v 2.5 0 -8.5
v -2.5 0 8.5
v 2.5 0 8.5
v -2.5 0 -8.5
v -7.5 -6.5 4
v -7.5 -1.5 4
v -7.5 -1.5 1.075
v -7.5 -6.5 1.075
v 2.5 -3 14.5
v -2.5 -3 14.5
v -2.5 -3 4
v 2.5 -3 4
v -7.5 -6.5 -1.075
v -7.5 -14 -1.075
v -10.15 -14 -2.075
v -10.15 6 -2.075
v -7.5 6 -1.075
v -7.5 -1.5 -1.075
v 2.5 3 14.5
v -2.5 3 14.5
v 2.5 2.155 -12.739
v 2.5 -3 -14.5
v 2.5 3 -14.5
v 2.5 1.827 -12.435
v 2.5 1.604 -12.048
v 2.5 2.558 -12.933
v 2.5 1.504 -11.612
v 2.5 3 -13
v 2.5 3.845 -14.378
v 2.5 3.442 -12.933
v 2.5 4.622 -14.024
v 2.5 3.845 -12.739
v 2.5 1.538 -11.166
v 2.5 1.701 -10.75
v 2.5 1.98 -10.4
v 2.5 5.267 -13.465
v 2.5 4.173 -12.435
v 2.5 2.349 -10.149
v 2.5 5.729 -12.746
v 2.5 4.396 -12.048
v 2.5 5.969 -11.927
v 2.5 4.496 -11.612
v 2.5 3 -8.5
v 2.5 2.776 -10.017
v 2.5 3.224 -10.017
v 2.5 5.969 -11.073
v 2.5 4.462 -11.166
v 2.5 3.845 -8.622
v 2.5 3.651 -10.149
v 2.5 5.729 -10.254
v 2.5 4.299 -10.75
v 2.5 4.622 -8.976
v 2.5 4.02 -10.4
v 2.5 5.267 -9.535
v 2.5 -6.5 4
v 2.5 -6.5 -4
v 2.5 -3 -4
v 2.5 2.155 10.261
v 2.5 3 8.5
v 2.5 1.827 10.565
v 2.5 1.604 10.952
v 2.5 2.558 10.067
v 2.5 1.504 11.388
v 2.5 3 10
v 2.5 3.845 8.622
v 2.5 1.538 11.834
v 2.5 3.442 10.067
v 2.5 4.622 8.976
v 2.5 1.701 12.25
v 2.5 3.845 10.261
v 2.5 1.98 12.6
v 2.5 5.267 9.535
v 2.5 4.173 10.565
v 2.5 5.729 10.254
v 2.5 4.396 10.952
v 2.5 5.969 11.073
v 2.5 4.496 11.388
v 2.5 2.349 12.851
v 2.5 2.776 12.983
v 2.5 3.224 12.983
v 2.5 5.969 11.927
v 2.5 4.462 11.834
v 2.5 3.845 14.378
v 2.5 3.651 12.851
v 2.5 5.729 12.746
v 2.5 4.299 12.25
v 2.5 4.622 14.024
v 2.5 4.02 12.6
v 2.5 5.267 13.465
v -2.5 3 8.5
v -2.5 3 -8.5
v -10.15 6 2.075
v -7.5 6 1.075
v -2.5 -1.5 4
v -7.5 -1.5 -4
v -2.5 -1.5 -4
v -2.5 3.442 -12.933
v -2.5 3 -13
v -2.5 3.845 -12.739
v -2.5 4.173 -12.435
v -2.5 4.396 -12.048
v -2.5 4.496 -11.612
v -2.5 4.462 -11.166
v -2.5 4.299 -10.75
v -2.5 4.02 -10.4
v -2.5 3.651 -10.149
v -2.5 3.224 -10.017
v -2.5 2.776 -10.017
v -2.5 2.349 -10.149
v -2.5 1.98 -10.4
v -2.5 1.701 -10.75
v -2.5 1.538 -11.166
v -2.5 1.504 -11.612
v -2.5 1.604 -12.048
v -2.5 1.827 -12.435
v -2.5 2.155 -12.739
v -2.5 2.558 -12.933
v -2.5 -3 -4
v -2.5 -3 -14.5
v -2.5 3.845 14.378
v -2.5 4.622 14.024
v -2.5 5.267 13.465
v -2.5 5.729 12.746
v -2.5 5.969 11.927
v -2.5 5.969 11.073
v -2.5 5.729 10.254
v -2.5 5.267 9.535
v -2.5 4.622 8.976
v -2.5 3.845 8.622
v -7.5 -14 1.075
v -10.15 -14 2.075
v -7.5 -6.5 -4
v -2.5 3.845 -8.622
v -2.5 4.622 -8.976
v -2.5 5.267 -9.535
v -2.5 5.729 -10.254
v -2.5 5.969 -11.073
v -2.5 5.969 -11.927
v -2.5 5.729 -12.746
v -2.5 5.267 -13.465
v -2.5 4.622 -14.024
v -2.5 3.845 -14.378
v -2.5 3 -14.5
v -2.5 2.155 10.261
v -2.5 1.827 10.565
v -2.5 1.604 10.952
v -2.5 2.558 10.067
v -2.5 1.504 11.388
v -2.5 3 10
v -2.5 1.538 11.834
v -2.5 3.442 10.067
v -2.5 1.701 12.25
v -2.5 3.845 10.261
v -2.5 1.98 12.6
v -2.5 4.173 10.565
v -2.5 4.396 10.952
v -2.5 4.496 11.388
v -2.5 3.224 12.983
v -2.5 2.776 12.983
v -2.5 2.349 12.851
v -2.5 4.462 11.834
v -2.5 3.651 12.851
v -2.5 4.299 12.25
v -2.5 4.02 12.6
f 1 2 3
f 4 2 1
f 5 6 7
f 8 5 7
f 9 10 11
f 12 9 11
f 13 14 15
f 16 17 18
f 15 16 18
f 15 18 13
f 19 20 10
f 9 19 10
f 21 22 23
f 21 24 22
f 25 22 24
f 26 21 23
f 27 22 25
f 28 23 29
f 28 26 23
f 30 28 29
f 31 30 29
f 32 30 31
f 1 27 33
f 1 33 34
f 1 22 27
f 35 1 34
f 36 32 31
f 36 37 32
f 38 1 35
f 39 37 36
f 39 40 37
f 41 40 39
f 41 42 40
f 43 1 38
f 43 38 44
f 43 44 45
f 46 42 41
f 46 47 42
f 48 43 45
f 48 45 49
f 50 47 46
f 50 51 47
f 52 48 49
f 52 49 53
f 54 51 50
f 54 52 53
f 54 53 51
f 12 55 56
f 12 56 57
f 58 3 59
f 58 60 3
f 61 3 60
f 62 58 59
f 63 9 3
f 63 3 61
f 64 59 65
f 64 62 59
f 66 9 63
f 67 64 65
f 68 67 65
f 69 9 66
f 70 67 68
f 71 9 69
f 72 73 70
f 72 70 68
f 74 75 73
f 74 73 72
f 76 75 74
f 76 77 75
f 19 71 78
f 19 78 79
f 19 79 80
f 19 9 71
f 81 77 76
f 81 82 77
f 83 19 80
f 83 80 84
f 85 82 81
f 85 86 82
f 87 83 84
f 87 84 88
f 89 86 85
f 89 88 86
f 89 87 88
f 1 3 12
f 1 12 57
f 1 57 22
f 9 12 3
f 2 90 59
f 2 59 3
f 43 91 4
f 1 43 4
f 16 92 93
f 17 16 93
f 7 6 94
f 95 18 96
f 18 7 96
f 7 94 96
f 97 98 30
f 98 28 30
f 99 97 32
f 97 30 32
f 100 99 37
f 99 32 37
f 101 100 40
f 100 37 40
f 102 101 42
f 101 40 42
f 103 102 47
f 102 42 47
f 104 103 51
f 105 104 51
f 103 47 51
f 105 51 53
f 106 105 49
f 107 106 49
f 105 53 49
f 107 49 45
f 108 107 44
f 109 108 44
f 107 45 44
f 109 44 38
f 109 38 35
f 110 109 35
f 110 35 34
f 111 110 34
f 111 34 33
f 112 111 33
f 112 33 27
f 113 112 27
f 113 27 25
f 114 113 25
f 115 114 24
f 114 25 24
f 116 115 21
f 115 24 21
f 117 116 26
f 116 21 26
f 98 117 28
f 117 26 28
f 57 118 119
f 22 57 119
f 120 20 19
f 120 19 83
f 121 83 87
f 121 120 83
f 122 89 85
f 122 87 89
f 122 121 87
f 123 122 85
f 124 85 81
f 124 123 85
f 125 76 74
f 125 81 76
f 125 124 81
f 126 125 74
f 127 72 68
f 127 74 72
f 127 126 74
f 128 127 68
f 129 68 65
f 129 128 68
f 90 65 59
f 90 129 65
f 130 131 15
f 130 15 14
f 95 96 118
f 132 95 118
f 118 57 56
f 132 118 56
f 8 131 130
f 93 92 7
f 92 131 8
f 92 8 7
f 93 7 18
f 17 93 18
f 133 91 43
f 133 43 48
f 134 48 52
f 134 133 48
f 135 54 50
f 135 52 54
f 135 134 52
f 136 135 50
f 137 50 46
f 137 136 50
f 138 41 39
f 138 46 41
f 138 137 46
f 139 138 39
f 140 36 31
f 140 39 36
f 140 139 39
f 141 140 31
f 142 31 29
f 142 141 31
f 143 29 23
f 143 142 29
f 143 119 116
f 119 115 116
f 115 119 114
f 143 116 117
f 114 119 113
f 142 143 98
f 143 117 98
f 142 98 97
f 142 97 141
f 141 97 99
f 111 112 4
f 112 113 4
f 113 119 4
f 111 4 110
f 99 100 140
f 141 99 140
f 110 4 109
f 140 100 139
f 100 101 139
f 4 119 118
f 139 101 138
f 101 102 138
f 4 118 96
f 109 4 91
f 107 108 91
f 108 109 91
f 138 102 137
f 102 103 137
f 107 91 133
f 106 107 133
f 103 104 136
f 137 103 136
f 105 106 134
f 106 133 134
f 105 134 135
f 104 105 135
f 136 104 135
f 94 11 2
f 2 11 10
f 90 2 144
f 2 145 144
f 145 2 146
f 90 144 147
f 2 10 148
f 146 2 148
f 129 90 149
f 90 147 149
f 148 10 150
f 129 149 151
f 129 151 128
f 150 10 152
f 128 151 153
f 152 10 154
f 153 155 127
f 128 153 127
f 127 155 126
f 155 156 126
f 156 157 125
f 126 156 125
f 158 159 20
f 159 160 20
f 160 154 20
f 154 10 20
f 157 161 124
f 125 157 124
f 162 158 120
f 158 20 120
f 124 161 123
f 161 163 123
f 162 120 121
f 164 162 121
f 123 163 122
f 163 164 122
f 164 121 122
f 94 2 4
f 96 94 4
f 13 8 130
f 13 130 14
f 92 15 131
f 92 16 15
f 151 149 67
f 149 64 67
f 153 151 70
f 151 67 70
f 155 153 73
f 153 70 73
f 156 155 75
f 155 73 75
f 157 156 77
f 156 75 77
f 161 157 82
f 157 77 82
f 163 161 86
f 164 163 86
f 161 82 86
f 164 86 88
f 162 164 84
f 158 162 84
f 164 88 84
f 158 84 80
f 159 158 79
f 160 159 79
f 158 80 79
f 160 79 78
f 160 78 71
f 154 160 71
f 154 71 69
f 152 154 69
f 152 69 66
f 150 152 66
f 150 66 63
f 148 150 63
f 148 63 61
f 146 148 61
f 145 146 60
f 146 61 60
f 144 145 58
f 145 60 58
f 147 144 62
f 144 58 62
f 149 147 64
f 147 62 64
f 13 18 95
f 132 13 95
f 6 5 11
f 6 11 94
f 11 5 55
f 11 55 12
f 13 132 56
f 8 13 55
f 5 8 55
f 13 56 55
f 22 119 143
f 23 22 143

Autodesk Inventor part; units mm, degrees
ref_plane "YZ Plane" through (0, 0, 0) normal (1, 0, 0) x (0, 1, 0)
ref_plane "XZ Plane" through (0, 0, 0) normal (0, 1, 0) x (-1, 0, 0)
ref_plane "XY Plane" through (0, 0, 0) normal (0, 0, 1) x (1, 0, 0)
sketch "Sketch1" plane through (0, 0, 0) normal (1, 0, 0) x (0, 1, 0)
  line L0 (0, 0) -> (0, 8.5)
  line L1 (0, 14.5) -> (6, 14.5)
  line L2 (0, 0) -> (0, -8.5)
  line L3 (0, -14.5) -> (6, -14.5)
  line L4 (6, -14.5) -> (6, -8.5)
  line L5 (6, -8.5) -> (0, -8.5)
  line L6 (6, 14.5) -> (6, 8.5)
  line L7 (6, 8.5) -> (0, 8.5)
  line L8 (0, 14.5) -> (-3, 14.5)
  line L9 (-3, 14.5) -> (-3, -14.5)
  line L10 (-3, -14.5) -> (0, -14.5)
  line L11 (0, -8.5) -> (-3, -8.5)
  line L12 (0, 8.5) -> (-3, 8.5)
  line L13 (-3, 0) -> (-3, -5)
  dimension "d0" = 14.5
  dimension "d1" = 6
  dimension "d2" = 14.5
  dimension "d3" = 6
  dimension "d4" = 90
  dimension "d5" = 29
  dimension "d6" = 6
  dimension "d7" = 6
  dimension "d8" = 3
  dimension "d9" = 5
extrude "Extrusion1" add sketch "Sketch1" along normal mid plane 5
sketch "Sketch2" plane through (2.5, 0, 0) normal (1, 0, 0) x (0, 0, -1)
  line L0 (8.5, 0) -> (-8.5, 0) projected
  line L1 (0, 0) -> (-8.5, 0)
  line L2 (-8.5, 0) -> (-11.5, 0)
  line L3 (-14.5, 6) -> (-14.5, -3) projected
  line L4 (-11.5, 0) -> (-11.5, 3)
  line L5 (8.5, 0) -> (11.5, 0)
  line L6 (11.5, 0) -> (11.5, 3)
  circle A0 centre (-11.5, 3) radius 1.5
  circle A1 centre (11.5, 3) radius 1.5
  dimension "d14" = 3
  dimension "d15" = 3
  dimension "d16" = 3
  dimension "d17" = 3
  dimension "d18" = 3
  dimension "d19" = 3
extrude "Extrusion2" cut sketch "Sketch2" against normal blind 10
sketch "Sketch3" plane through (-2.5, 0, 0) normal (-1, 0, 0) x (0, 0, 1)
  circle A0 centre (-11.5, 3) radius 1.5 projected
  circle A1 centre (-11.5, 3) radius 3
  line L0 (-14.5, 3) -> (-14.5, 7.7039)
  line L1 (-14.5, -3) -> (-14.5, 6) projected
  line L2 (-14.5, 7.7039) -> (-8.5, 7.7039)
  line L3 (-8.5, 7.7039) -> (-8.5, 3)
  circle A2 centre (11.5, 3) radius 1.5 projected
  circle A3 centre (11.5, 3) radius 3
  line L4 (8.5, 3) -> (8.5, 6.9796)
  line L5 (8.5, 6.9796) -> (14.5, 6.9796)
  line L6 (14.5, 6.9796) -> (14.5, 3)
  line L7 (14.5, 6) -> (14.5, -3) projected
  point P0 (0, 0)
extrude "Extrusion3" cut sketch "Sketch3" against normal through all contours A1 L0 L2 L3 | A3 L4 L5 L6
sketch "Sketch4" plane through (2.5, 0, 0) normal (1, 0, 0) x (0, 0, -1)
  line L0 (14.5, -3) -> (-14.5, -3) projected
  line L1 (0, -3) -> (4, -3)
  line L2 (0, -3) -> (-4, -3)
  line L3 (-4, -3) -> (-4, -1.5)
  line L4 (-4, -1.5) -> (4, -1.5)
  line L5 (4, -1.5) -> (4, -6.5)
  line L6 (4, -6.5) -> (-4, -6.5)
  line L7 (-4, -6.5) -> (-4, -1.5)
  point P0 (0, 0)
  dimension "d24" = 4
  dimension "d25" = 4
  dimension "d26" = 1.5
  dimension "d27" = 5
  dimension "d28" = 8
extrude "Extrusion4" add sketch "Sketch4" against normal blind 10
sketch "Sketch24" plane through (-7.5, -1.5, -4) normal (0, 1, 0) x (1, 0, 0)
  line L0 (0, -8) -> (0, 0) projected
  line L1 (0, 0) -> (0, -4)
  line L2 (5, -8) -> (0, -8) projected
  line L3 (0, -4) -> (0, -5.075)
  line L4 (0, -4) -> (0, -2.925)
  line L5 (0, -4) -> (-2.65, -4)
  line L6 (-2.65, -4) -> (-2.65, -6.075)
  line L7 (-2.65, -4) -> (-0.575, -4) construction
  line L8 (-2.65, -4) -> (-2.65, -1.925)
  line L9 (-2.65, -1.925) -> (0, -2.925)
  line L10 (0, -5.075) -> (-2.65, -6.075)
  point P0 (7.5, -4)
  dimension "d150" = 4
  dimension "d151" = 1.075
  dimension "d152" = 1.075
  dimension "d153" = 2.65
  dimension "d154" = 2.075
  dimension "d155" = 90
  dimension "d156" = 2.075
extrude "Extrusion20" add sketch "Sketch24" along normal mid plane 15
sketch "Sketch25" plane through (2.5, -6.5, -4) normal (0, -1, 0) x (1, 0, 0)
  line L0 (-10, 2.925) -> (-12.65, 1.925) projected
  line L1 (-12.65, 1.925) -> (-12.65, 6.075) projected
  line L2 (-12.65, 1.925) -> (-12.65, 6.075)
  line L3 (-10, 8) -> (-10, 5.075) projected
  line L4 (-12.65, 6.075) -> (-10, 5.075)
  line L5 (-10, 5.075) -> (-10, 2.925) projected
  line L6 (-10, 5.075) -> (-10, 2.925)
  line L7 (-10, 2.925) -> (-12.65, 1.925)
  point P0 (-2.5, 4)
extrude "Extrusion21" add sketch "Sketch25" along normal blind 7.5
properties part number "pelvis øvre del"
